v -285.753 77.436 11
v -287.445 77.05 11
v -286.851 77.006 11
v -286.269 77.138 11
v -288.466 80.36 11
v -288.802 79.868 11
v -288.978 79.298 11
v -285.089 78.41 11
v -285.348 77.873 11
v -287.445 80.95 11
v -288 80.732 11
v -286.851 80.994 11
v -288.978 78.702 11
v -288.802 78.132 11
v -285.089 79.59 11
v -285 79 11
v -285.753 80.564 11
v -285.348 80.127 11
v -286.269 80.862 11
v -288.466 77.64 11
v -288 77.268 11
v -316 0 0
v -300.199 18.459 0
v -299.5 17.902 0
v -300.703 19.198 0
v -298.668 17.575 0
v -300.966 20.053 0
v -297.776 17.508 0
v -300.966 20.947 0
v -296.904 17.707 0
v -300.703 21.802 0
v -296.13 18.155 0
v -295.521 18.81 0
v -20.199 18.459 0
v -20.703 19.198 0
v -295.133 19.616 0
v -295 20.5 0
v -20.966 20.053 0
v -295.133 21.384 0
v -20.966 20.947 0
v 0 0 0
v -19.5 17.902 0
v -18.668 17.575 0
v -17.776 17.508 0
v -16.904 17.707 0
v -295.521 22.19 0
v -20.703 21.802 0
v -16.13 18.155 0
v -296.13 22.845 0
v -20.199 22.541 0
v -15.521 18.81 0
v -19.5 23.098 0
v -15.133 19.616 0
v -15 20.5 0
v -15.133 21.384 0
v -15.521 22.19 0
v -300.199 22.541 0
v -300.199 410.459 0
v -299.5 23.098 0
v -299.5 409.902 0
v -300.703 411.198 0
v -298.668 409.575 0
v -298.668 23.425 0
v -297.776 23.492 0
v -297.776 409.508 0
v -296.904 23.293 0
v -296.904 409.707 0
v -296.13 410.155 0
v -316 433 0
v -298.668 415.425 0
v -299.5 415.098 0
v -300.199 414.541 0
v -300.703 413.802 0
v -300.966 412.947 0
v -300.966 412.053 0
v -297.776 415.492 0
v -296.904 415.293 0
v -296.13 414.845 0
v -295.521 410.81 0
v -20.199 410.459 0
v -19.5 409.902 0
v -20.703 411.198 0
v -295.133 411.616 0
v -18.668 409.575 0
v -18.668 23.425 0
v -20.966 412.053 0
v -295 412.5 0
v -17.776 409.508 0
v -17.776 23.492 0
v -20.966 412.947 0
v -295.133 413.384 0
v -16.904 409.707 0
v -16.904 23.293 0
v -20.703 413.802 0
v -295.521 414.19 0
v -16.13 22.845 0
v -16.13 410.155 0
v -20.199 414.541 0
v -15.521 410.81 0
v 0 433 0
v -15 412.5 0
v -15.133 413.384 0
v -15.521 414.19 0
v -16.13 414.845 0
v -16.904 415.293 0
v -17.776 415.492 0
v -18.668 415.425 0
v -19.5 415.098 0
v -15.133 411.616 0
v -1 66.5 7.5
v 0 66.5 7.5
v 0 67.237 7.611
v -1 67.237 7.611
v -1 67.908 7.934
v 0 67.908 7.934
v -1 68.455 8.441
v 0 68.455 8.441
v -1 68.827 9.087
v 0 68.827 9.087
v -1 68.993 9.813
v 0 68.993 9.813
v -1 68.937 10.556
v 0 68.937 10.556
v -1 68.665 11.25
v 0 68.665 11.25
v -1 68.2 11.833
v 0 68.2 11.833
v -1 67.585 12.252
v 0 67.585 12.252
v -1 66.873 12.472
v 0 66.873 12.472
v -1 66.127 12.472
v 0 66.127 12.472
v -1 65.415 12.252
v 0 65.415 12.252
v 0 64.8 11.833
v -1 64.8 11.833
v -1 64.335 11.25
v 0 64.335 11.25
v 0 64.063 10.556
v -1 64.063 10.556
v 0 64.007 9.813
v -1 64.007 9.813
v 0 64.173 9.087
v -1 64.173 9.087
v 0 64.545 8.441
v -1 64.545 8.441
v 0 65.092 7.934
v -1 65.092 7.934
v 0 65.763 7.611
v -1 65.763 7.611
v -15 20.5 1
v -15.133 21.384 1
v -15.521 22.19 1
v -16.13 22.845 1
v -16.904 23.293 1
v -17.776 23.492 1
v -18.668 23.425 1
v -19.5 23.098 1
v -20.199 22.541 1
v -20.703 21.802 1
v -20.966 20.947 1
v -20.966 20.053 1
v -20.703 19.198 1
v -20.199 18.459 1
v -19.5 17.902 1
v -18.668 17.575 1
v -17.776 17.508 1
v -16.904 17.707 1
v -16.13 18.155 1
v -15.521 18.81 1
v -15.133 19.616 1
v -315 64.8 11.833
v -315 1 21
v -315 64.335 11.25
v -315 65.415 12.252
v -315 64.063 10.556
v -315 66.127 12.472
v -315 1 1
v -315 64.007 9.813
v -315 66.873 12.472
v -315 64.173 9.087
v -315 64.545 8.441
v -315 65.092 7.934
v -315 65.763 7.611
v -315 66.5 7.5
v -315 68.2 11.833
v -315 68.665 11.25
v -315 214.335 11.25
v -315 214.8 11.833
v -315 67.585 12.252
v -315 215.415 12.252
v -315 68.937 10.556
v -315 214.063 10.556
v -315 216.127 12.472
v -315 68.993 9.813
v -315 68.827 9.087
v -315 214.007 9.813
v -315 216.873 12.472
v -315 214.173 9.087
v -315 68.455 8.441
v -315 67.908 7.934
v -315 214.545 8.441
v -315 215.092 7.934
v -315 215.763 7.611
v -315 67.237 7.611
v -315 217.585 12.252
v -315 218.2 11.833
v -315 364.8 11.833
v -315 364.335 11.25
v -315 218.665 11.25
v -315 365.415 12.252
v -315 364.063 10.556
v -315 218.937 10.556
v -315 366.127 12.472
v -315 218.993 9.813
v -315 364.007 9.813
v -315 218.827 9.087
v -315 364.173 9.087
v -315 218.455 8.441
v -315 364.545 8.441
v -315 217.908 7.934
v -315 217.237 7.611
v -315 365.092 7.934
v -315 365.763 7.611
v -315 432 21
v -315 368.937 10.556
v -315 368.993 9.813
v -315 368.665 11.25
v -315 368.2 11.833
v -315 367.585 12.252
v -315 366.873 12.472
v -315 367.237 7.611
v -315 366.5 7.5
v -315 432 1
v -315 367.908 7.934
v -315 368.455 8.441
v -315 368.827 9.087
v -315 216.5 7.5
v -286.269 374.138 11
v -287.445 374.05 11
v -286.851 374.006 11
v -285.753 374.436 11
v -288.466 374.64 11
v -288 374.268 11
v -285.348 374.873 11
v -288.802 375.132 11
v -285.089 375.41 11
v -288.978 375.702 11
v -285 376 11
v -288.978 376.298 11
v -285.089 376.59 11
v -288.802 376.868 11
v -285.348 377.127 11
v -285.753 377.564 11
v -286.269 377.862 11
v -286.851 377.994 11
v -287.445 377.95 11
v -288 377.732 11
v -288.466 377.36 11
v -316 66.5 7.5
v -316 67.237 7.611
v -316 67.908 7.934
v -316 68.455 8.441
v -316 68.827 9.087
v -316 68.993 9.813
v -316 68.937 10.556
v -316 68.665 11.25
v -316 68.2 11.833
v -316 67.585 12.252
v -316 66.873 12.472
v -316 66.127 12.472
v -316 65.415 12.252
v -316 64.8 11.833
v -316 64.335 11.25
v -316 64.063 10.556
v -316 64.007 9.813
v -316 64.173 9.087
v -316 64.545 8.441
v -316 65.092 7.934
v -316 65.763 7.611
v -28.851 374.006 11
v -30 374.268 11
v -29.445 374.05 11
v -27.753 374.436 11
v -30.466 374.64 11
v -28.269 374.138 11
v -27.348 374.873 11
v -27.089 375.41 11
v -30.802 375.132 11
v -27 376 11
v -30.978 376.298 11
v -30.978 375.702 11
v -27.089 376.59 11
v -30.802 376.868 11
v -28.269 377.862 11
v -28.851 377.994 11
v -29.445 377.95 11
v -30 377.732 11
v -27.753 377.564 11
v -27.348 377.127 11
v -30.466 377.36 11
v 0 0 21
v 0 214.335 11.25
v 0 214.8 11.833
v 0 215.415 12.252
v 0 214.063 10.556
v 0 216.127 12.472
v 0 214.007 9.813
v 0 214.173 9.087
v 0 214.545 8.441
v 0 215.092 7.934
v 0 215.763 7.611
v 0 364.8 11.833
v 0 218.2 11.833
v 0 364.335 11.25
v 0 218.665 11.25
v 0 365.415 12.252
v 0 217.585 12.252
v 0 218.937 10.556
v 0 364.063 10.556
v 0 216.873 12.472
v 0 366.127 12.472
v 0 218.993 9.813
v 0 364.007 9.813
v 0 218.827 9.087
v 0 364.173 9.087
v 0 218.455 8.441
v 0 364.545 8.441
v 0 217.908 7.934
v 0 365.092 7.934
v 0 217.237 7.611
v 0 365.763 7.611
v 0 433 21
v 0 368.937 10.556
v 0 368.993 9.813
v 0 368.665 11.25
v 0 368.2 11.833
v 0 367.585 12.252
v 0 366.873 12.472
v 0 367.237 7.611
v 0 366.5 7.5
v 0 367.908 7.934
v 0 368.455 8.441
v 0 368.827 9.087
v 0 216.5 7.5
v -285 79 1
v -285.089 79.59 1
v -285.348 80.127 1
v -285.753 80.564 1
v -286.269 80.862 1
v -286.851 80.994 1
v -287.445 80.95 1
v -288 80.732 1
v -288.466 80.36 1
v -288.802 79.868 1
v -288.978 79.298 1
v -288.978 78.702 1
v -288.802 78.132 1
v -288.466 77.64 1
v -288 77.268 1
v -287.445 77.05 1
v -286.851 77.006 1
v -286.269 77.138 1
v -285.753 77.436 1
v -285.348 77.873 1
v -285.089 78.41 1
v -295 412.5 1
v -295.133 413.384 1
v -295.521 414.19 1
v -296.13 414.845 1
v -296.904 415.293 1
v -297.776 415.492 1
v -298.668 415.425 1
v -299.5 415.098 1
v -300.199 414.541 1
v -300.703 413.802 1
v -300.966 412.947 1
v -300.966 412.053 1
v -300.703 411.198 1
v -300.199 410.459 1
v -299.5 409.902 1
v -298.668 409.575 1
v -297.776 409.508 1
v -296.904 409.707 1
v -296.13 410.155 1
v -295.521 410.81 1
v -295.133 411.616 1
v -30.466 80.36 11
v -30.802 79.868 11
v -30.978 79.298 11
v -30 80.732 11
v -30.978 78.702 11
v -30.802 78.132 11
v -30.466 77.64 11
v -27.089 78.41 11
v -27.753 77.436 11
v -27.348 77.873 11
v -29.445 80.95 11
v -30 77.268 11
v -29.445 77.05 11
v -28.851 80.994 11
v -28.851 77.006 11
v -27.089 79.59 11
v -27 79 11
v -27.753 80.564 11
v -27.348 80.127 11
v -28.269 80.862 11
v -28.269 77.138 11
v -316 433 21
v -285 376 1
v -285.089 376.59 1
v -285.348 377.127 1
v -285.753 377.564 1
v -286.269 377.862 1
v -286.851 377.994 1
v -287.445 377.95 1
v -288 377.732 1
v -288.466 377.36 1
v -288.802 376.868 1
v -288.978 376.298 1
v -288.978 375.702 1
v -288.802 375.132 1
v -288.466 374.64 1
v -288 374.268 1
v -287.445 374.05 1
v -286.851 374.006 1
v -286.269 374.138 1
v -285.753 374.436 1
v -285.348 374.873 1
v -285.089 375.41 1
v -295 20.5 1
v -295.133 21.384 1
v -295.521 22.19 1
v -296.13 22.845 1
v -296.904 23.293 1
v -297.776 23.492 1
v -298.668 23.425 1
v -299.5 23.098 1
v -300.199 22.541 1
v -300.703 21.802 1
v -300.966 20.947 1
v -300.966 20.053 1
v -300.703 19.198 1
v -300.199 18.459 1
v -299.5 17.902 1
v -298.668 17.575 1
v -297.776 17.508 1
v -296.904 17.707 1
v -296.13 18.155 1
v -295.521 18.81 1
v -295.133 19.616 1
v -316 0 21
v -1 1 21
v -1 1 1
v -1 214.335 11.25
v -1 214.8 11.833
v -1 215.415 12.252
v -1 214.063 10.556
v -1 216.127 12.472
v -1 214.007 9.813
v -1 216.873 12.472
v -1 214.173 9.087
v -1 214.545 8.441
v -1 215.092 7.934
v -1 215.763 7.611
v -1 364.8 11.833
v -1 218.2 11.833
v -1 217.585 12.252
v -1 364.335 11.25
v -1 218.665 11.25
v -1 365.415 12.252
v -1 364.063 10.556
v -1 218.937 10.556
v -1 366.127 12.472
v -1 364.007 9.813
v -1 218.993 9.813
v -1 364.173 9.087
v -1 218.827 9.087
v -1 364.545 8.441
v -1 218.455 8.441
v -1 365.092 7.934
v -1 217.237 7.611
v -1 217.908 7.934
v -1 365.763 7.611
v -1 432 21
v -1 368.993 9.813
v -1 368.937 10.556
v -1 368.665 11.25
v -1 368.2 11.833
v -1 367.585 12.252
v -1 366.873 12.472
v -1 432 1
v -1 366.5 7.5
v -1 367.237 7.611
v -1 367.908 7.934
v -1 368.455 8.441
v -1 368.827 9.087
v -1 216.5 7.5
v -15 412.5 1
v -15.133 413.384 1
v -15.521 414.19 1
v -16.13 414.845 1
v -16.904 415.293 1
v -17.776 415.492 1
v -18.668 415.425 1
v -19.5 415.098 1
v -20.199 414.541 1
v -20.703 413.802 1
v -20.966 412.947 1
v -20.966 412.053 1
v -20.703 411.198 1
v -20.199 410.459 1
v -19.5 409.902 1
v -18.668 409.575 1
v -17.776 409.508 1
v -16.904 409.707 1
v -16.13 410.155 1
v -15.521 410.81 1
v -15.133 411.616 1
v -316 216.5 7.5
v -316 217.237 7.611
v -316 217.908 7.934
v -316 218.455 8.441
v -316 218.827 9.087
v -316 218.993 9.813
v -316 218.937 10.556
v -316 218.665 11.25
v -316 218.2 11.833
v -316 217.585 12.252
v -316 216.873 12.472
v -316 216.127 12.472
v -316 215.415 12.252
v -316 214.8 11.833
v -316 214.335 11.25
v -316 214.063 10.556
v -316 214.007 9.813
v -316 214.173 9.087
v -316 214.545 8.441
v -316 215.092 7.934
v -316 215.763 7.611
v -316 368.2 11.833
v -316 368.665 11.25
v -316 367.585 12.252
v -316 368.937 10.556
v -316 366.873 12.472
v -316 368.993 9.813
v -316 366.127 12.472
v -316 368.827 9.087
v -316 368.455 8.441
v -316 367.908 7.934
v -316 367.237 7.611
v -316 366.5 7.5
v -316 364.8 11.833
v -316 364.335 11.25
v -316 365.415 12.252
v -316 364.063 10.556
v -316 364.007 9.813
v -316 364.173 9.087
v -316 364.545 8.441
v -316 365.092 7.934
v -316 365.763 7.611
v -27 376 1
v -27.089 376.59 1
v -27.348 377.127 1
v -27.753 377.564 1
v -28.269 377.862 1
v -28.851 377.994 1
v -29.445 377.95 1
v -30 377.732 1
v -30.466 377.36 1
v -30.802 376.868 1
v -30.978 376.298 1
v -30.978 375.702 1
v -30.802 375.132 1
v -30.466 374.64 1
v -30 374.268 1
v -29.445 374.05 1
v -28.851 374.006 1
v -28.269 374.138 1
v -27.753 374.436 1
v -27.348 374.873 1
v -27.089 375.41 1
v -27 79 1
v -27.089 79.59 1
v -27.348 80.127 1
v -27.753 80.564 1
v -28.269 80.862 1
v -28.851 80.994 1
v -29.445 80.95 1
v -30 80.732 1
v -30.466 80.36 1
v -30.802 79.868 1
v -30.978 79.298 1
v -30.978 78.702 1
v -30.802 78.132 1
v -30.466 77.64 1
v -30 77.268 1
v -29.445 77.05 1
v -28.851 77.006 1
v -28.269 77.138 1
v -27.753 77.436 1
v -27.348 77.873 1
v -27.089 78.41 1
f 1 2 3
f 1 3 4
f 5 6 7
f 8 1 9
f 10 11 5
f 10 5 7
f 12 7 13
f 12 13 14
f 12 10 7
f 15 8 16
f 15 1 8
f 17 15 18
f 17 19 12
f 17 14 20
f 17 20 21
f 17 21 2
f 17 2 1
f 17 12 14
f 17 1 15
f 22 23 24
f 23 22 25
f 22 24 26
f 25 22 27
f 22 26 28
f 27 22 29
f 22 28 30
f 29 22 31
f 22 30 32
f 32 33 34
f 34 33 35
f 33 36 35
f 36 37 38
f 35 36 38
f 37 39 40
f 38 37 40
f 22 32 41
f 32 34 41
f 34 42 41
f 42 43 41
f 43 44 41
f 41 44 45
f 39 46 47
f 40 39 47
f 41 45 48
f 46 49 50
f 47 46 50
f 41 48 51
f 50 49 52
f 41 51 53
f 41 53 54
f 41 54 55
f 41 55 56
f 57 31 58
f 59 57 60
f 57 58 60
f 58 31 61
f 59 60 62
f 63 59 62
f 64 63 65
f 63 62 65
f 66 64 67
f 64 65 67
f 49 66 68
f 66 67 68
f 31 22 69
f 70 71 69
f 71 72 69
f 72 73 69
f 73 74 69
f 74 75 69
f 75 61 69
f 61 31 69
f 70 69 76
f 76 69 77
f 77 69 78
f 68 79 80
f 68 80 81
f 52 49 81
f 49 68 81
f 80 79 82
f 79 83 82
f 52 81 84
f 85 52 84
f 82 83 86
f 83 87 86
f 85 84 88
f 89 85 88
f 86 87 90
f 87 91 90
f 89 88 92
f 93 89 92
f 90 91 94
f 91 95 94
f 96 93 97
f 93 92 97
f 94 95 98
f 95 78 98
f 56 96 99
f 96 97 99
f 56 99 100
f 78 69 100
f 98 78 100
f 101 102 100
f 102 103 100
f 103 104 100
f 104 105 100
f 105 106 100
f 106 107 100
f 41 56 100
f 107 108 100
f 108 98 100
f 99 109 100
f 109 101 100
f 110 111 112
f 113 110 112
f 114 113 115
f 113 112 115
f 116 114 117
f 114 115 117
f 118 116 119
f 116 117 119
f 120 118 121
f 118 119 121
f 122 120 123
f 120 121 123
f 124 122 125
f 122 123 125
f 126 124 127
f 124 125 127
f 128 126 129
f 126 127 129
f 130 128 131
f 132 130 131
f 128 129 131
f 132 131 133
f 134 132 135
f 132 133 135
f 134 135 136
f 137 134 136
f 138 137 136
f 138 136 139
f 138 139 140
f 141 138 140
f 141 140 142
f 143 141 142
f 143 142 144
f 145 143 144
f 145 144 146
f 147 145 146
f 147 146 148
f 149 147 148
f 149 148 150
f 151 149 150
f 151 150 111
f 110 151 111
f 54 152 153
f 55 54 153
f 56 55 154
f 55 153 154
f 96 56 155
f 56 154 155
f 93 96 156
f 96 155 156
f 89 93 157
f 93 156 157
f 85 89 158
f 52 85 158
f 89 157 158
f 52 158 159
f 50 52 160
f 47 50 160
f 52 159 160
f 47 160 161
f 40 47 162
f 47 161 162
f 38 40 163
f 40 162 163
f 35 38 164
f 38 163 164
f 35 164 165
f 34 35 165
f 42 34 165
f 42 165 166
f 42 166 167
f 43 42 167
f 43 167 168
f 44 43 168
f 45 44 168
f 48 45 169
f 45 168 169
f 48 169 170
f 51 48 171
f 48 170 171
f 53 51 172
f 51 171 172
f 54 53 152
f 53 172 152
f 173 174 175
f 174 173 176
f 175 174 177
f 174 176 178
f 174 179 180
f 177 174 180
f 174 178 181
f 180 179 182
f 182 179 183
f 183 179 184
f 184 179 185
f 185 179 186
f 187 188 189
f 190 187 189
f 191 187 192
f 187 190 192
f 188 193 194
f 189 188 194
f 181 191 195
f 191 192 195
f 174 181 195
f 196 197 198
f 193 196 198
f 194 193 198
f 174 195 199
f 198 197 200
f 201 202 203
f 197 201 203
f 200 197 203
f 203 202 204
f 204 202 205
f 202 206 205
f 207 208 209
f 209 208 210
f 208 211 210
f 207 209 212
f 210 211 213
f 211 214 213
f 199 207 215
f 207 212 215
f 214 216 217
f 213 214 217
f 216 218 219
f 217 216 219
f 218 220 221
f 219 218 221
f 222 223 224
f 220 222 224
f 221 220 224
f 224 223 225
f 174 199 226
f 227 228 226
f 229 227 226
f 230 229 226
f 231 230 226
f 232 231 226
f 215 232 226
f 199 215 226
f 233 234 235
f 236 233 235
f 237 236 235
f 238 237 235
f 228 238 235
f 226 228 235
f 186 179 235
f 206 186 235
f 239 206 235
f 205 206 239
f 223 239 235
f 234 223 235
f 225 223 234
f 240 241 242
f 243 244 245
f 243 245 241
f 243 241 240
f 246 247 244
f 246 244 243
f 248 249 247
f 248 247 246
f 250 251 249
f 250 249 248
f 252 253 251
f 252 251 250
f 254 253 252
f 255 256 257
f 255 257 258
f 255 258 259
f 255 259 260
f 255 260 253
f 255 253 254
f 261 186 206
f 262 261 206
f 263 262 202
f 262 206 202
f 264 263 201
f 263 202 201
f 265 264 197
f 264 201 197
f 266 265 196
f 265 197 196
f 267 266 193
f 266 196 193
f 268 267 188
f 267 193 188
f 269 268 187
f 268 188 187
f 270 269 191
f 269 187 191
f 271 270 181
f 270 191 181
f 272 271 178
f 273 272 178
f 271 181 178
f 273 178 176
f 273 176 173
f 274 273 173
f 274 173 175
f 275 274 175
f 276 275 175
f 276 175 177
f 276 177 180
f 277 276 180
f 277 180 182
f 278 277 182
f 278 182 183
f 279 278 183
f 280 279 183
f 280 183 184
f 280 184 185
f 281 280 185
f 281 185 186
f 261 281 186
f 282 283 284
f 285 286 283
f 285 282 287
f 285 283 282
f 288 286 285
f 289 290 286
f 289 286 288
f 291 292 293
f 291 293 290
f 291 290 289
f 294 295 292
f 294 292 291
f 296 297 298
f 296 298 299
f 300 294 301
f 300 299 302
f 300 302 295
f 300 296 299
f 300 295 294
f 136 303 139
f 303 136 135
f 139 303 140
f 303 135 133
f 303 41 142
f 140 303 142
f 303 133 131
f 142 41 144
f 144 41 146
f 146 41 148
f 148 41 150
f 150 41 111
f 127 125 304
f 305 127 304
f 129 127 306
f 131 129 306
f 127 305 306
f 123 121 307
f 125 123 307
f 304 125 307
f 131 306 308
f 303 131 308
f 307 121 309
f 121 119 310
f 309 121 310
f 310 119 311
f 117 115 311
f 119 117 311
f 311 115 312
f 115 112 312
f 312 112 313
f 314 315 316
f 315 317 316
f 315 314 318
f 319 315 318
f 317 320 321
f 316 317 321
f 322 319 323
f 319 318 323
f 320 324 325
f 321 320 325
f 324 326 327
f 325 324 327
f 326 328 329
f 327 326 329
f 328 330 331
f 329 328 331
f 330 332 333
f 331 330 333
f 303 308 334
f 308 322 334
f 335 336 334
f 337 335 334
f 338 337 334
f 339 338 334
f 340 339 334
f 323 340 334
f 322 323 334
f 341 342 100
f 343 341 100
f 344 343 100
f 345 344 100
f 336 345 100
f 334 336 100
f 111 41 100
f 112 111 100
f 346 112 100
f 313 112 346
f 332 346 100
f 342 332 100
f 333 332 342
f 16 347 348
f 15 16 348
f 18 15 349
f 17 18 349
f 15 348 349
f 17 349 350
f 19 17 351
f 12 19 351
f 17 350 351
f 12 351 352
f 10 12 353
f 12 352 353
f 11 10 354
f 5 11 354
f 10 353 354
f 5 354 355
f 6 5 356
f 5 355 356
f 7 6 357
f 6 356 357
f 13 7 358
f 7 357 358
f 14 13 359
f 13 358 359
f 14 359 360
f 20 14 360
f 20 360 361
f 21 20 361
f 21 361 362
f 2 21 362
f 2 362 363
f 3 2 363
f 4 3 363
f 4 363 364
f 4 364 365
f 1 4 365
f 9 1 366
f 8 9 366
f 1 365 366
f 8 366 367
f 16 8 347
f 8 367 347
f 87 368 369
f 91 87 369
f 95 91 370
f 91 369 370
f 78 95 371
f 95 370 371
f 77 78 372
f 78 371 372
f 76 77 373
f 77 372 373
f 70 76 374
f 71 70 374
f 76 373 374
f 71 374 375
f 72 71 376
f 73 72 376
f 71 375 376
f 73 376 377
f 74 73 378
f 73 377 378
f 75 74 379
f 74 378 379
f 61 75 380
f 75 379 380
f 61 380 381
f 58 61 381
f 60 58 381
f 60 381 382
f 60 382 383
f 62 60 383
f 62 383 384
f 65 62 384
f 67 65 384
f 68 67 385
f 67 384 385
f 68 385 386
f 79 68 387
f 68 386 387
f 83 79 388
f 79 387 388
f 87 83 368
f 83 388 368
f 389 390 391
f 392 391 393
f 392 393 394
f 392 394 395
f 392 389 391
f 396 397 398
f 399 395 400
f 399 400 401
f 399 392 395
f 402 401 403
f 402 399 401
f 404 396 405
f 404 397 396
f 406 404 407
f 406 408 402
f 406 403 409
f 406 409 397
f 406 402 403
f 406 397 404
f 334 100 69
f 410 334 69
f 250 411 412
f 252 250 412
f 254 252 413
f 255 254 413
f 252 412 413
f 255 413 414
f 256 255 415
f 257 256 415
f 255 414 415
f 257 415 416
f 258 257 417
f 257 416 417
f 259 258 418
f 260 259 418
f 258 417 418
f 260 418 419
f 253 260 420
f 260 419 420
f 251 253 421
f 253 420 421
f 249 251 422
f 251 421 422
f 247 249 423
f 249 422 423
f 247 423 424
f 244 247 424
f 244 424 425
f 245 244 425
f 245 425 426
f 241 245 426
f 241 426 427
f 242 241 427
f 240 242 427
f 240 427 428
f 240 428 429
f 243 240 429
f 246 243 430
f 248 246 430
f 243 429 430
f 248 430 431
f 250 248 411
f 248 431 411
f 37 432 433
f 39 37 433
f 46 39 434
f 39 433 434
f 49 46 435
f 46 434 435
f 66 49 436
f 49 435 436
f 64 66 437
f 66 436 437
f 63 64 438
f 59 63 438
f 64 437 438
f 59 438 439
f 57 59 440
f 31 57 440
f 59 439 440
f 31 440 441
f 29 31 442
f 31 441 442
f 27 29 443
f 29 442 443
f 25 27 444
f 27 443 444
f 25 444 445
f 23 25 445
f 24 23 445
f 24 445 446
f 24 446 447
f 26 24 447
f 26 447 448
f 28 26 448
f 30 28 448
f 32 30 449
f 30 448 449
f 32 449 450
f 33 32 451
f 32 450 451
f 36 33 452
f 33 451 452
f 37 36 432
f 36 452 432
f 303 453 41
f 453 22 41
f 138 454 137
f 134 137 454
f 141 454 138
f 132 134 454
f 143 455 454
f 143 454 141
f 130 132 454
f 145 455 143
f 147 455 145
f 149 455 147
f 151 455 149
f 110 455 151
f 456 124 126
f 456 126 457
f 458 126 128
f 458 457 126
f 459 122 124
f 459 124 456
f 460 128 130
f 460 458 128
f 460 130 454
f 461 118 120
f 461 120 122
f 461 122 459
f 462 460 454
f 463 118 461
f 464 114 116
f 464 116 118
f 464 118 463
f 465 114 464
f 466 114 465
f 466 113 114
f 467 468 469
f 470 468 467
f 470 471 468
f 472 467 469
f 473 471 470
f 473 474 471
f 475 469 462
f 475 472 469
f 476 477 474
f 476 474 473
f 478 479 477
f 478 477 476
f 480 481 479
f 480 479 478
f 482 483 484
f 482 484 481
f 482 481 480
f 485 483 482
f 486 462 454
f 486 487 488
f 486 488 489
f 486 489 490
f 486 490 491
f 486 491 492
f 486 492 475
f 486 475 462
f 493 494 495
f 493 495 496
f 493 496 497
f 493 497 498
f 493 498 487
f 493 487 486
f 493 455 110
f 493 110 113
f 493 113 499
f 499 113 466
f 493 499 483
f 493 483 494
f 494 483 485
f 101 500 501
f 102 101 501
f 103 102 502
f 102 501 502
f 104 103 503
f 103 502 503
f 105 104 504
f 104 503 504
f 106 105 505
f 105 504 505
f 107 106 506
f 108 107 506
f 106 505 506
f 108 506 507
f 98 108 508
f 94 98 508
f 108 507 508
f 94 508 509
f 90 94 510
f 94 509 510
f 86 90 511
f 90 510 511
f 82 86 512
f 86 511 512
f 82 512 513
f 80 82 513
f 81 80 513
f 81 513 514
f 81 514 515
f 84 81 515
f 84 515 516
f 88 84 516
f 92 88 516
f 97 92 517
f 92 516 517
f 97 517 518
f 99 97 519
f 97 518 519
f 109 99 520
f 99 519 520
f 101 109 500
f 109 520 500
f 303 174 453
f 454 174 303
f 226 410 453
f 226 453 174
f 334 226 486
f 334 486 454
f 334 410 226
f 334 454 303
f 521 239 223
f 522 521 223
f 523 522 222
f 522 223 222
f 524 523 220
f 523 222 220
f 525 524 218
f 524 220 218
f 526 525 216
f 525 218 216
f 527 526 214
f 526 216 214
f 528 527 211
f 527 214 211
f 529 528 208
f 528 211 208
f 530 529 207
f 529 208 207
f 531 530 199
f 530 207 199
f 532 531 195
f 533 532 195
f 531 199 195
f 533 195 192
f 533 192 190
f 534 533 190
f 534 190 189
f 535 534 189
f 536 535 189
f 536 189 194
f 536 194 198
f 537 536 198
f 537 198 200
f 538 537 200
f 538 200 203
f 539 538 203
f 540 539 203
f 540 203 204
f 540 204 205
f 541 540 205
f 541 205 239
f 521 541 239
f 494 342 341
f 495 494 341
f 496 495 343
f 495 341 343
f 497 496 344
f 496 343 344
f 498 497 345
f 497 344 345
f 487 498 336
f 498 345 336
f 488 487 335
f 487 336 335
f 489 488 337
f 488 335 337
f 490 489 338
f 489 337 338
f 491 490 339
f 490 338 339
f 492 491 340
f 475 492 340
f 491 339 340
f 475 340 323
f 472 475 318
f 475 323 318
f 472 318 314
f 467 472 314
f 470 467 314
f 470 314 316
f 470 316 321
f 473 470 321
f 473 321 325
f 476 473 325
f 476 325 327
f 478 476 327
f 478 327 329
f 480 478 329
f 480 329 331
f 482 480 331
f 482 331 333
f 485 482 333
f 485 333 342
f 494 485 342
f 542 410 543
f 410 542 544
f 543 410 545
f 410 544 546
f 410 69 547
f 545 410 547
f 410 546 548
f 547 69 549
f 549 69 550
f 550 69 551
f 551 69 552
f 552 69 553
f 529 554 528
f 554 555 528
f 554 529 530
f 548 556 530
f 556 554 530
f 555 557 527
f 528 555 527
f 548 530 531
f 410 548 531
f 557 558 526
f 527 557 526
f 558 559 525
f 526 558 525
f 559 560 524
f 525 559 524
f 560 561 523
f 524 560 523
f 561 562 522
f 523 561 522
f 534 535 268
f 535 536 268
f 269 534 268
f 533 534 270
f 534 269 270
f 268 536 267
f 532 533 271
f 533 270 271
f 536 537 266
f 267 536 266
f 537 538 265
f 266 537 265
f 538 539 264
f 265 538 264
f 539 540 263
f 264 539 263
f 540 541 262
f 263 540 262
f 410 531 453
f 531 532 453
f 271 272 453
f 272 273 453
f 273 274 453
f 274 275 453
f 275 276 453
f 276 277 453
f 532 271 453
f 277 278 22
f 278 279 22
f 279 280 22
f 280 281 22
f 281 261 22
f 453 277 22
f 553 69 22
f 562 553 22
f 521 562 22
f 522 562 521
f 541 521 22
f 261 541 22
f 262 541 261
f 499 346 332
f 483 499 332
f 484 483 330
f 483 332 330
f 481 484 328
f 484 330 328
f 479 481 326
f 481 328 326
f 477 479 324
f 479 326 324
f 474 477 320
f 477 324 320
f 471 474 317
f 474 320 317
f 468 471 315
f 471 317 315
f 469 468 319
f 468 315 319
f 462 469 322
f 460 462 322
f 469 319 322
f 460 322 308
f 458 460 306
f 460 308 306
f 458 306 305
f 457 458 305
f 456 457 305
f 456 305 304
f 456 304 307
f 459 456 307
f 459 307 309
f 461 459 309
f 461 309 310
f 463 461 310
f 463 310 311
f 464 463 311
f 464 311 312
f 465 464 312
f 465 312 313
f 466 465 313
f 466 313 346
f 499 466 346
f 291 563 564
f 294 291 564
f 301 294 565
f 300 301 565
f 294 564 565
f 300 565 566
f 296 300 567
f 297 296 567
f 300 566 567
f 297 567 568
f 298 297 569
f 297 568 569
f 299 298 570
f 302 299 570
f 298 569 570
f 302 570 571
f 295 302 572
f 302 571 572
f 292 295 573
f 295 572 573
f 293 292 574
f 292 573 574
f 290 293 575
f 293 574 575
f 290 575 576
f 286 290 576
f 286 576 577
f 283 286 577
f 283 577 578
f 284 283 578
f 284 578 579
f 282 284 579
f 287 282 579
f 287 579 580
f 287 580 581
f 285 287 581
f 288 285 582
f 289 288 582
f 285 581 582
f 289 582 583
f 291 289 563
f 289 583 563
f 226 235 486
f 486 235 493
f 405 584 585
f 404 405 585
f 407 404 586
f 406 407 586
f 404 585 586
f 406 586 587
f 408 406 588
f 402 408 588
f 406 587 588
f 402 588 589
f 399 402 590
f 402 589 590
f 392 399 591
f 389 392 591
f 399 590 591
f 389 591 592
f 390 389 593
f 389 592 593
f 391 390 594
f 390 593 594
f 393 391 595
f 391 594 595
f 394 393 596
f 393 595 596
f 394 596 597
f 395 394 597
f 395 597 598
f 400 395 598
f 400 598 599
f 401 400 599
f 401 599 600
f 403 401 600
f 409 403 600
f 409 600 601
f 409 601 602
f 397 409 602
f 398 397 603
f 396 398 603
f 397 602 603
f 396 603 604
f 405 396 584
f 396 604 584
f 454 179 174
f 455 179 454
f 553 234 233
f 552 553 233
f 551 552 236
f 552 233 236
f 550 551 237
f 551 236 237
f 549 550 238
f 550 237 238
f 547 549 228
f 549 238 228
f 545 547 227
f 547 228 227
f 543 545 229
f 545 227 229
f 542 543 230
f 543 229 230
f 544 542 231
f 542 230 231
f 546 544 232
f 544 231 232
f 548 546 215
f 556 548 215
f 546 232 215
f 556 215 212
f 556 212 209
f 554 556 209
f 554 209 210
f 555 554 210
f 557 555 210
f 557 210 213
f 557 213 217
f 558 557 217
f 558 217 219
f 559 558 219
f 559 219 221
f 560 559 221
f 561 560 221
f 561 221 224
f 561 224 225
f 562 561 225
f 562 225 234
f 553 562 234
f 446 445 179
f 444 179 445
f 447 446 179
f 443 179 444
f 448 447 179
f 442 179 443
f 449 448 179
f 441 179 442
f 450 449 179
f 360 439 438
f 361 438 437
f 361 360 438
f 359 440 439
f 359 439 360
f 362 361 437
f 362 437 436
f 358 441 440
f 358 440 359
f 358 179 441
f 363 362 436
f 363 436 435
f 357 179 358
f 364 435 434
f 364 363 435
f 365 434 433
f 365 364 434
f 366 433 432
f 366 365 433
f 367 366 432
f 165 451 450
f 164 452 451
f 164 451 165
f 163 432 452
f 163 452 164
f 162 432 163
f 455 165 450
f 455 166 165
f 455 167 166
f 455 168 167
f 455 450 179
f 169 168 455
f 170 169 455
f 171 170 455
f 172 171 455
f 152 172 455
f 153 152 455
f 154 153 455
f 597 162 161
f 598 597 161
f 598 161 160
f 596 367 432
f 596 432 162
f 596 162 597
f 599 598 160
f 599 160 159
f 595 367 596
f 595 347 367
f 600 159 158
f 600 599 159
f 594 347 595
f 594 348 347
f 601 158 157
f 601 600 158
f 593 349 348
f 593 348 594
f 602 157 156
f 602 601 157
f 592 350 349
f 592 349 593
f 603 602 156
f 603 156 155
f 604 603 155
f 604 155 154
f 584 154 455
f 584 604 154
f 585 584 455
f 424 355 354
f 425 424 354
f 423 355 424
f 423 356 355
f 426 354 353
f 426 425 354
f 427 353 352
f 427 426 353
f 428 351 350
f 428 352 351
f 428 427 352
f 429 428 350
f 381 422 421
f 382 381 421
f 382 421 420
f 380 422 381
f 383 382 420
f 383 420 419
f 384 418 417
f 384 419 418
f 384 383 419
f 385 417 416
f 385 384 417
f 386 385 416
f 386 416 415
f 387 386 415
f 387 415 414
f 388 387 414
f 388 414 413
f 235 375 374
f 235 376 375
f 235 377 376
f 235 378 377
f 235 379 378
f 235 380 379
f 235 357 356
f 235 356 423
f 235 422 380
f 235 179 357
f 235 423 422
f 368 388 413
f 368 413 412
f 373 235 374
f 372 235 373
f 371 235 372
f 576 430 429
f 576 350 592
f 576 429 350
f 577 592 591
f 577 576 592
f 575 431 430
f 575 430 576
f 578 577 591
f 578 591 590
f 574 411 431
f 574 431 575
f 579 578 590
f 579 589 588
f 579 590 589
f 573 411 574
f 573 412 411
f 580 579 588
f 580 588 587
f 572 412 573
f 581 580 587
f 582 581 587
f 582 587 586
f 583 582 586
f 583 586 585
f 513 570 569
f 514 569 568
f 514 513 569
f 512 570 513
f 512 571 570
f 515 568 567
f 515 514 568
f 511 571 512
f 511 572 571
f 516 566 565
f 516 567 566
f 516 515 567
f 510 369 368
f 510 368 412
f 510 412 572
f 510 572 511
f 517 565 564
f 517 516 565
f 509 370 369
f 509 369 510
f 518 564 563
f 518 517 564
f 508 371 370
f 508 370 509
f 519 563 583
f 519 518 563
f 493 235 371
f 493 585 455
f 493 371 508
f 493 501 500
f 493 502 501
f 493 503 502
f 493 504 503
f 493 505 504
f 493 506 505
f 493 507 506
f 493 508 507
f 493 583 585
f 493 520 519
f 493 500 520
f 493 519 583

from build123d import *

# Parameters (mm, degrees)
CROQUIS1_W              = 316
CROQUIS1_H              = 433
SALIENTE_EXTRUIR3_DEPTH = 1
CROQUIS2_W              = 314
CROQUIS2_H              = 431
SALIENTE_EXTRUIR4_DEPTH = 20
CROQUIS3_R              = 2
SALIENTE_EXTRUIR5_DEPTH = 10
CROQUIS4_R              = 2.5
CORTAR_EXTRUIR1_DEPTH   = 316
CROQUIS5_R              = 3
CORTAR_EXTRUIR2_DEPTH   = 1


with BuildPart() as part:
    # Croquis1 → Saliente-Extruir3 (new body)
    with BuildSketch(Plane.XY):
        with Locations((-158, 216.5)):
            Rectangle(CROQUIS1_W, CROQUIS1_H)
    extrude(amount=SALIENTE_EXTRUIR3_DEPTH)

    # Croquis2 → Saliente-Extruir4 (add)
    with BuildSketch(Plane.XY.offset(1)):
        Polygon((-315, 433), (-316, 433), (-316, 432), (-316, 1), (-316, 0), (-315, 0), (-1, 0), (0, 0), (0, 1), (0, 432), (0, 433), align=None)
        with Locations((-158, 216.5)):
            Rectangle(CROQUIS2_W, CROQUIS2_H, mode=Mode.SUBTRACT)
    extrude(amount=SALIENTE_EXTRUIR4_DEPTH)

    # Croquis3 → Saliente-Extruir5 (add)
    with BuildSketch(Plane.XY.offset(1)):
        with Locations((-287, 376)):
            Circle(CROQUIS3_R)
        with Locations((-29, 376)):
            Circle(CROQUIS3_R)
        with Locations((-287, 79)):
            Circle(CROQUIS3_R)
        with Locations((-29, 79)):
            Circle(CROQUIS3_R)
    extrude(amount=SALIENTE_EXTRUIR5_DEPTH)

    # Croquis4 → Cortar-Extruir1 (cut)
    with BuildSketch(Plane(origin=(0, 0, 0), x_dir=(0, 0, -1), z_dir=(1, 0, 0))):
        with Locations((-10, 366.5)):
            Circle(CROQUIS4_R)
        with Locations((-10, 66.5)):
            Circle(CROQUIS4_R)
        with Locations((-10, 216.5)):
            Circle(CROQUIS4_R)
    extrude(amount=-CORTAR_EXTRUIR1_DEPTH, mode=Mode.SUBTRACT)

    # Croquis5 → Cortar-Extruir2 (cut)
    with BuildSketch(Plane.XY.offset(1)):
        with Locations((-298, 412.5)):
            Circle(CROQUIS5_R)
        with Locations((-298, 20.5)):
            Circle(CROQUIS5_R)
        with Locations((-18, 412.5)):
            Circle(CROQUIS5_R)
        with Locations((-18, 20.5)):
            Circle(CROQUIS5_R)
    extrude(amount=-CORTAR_EXTRUIR2_DEPTH, mode=Mode.SUBTRACT)


solid = part.part
